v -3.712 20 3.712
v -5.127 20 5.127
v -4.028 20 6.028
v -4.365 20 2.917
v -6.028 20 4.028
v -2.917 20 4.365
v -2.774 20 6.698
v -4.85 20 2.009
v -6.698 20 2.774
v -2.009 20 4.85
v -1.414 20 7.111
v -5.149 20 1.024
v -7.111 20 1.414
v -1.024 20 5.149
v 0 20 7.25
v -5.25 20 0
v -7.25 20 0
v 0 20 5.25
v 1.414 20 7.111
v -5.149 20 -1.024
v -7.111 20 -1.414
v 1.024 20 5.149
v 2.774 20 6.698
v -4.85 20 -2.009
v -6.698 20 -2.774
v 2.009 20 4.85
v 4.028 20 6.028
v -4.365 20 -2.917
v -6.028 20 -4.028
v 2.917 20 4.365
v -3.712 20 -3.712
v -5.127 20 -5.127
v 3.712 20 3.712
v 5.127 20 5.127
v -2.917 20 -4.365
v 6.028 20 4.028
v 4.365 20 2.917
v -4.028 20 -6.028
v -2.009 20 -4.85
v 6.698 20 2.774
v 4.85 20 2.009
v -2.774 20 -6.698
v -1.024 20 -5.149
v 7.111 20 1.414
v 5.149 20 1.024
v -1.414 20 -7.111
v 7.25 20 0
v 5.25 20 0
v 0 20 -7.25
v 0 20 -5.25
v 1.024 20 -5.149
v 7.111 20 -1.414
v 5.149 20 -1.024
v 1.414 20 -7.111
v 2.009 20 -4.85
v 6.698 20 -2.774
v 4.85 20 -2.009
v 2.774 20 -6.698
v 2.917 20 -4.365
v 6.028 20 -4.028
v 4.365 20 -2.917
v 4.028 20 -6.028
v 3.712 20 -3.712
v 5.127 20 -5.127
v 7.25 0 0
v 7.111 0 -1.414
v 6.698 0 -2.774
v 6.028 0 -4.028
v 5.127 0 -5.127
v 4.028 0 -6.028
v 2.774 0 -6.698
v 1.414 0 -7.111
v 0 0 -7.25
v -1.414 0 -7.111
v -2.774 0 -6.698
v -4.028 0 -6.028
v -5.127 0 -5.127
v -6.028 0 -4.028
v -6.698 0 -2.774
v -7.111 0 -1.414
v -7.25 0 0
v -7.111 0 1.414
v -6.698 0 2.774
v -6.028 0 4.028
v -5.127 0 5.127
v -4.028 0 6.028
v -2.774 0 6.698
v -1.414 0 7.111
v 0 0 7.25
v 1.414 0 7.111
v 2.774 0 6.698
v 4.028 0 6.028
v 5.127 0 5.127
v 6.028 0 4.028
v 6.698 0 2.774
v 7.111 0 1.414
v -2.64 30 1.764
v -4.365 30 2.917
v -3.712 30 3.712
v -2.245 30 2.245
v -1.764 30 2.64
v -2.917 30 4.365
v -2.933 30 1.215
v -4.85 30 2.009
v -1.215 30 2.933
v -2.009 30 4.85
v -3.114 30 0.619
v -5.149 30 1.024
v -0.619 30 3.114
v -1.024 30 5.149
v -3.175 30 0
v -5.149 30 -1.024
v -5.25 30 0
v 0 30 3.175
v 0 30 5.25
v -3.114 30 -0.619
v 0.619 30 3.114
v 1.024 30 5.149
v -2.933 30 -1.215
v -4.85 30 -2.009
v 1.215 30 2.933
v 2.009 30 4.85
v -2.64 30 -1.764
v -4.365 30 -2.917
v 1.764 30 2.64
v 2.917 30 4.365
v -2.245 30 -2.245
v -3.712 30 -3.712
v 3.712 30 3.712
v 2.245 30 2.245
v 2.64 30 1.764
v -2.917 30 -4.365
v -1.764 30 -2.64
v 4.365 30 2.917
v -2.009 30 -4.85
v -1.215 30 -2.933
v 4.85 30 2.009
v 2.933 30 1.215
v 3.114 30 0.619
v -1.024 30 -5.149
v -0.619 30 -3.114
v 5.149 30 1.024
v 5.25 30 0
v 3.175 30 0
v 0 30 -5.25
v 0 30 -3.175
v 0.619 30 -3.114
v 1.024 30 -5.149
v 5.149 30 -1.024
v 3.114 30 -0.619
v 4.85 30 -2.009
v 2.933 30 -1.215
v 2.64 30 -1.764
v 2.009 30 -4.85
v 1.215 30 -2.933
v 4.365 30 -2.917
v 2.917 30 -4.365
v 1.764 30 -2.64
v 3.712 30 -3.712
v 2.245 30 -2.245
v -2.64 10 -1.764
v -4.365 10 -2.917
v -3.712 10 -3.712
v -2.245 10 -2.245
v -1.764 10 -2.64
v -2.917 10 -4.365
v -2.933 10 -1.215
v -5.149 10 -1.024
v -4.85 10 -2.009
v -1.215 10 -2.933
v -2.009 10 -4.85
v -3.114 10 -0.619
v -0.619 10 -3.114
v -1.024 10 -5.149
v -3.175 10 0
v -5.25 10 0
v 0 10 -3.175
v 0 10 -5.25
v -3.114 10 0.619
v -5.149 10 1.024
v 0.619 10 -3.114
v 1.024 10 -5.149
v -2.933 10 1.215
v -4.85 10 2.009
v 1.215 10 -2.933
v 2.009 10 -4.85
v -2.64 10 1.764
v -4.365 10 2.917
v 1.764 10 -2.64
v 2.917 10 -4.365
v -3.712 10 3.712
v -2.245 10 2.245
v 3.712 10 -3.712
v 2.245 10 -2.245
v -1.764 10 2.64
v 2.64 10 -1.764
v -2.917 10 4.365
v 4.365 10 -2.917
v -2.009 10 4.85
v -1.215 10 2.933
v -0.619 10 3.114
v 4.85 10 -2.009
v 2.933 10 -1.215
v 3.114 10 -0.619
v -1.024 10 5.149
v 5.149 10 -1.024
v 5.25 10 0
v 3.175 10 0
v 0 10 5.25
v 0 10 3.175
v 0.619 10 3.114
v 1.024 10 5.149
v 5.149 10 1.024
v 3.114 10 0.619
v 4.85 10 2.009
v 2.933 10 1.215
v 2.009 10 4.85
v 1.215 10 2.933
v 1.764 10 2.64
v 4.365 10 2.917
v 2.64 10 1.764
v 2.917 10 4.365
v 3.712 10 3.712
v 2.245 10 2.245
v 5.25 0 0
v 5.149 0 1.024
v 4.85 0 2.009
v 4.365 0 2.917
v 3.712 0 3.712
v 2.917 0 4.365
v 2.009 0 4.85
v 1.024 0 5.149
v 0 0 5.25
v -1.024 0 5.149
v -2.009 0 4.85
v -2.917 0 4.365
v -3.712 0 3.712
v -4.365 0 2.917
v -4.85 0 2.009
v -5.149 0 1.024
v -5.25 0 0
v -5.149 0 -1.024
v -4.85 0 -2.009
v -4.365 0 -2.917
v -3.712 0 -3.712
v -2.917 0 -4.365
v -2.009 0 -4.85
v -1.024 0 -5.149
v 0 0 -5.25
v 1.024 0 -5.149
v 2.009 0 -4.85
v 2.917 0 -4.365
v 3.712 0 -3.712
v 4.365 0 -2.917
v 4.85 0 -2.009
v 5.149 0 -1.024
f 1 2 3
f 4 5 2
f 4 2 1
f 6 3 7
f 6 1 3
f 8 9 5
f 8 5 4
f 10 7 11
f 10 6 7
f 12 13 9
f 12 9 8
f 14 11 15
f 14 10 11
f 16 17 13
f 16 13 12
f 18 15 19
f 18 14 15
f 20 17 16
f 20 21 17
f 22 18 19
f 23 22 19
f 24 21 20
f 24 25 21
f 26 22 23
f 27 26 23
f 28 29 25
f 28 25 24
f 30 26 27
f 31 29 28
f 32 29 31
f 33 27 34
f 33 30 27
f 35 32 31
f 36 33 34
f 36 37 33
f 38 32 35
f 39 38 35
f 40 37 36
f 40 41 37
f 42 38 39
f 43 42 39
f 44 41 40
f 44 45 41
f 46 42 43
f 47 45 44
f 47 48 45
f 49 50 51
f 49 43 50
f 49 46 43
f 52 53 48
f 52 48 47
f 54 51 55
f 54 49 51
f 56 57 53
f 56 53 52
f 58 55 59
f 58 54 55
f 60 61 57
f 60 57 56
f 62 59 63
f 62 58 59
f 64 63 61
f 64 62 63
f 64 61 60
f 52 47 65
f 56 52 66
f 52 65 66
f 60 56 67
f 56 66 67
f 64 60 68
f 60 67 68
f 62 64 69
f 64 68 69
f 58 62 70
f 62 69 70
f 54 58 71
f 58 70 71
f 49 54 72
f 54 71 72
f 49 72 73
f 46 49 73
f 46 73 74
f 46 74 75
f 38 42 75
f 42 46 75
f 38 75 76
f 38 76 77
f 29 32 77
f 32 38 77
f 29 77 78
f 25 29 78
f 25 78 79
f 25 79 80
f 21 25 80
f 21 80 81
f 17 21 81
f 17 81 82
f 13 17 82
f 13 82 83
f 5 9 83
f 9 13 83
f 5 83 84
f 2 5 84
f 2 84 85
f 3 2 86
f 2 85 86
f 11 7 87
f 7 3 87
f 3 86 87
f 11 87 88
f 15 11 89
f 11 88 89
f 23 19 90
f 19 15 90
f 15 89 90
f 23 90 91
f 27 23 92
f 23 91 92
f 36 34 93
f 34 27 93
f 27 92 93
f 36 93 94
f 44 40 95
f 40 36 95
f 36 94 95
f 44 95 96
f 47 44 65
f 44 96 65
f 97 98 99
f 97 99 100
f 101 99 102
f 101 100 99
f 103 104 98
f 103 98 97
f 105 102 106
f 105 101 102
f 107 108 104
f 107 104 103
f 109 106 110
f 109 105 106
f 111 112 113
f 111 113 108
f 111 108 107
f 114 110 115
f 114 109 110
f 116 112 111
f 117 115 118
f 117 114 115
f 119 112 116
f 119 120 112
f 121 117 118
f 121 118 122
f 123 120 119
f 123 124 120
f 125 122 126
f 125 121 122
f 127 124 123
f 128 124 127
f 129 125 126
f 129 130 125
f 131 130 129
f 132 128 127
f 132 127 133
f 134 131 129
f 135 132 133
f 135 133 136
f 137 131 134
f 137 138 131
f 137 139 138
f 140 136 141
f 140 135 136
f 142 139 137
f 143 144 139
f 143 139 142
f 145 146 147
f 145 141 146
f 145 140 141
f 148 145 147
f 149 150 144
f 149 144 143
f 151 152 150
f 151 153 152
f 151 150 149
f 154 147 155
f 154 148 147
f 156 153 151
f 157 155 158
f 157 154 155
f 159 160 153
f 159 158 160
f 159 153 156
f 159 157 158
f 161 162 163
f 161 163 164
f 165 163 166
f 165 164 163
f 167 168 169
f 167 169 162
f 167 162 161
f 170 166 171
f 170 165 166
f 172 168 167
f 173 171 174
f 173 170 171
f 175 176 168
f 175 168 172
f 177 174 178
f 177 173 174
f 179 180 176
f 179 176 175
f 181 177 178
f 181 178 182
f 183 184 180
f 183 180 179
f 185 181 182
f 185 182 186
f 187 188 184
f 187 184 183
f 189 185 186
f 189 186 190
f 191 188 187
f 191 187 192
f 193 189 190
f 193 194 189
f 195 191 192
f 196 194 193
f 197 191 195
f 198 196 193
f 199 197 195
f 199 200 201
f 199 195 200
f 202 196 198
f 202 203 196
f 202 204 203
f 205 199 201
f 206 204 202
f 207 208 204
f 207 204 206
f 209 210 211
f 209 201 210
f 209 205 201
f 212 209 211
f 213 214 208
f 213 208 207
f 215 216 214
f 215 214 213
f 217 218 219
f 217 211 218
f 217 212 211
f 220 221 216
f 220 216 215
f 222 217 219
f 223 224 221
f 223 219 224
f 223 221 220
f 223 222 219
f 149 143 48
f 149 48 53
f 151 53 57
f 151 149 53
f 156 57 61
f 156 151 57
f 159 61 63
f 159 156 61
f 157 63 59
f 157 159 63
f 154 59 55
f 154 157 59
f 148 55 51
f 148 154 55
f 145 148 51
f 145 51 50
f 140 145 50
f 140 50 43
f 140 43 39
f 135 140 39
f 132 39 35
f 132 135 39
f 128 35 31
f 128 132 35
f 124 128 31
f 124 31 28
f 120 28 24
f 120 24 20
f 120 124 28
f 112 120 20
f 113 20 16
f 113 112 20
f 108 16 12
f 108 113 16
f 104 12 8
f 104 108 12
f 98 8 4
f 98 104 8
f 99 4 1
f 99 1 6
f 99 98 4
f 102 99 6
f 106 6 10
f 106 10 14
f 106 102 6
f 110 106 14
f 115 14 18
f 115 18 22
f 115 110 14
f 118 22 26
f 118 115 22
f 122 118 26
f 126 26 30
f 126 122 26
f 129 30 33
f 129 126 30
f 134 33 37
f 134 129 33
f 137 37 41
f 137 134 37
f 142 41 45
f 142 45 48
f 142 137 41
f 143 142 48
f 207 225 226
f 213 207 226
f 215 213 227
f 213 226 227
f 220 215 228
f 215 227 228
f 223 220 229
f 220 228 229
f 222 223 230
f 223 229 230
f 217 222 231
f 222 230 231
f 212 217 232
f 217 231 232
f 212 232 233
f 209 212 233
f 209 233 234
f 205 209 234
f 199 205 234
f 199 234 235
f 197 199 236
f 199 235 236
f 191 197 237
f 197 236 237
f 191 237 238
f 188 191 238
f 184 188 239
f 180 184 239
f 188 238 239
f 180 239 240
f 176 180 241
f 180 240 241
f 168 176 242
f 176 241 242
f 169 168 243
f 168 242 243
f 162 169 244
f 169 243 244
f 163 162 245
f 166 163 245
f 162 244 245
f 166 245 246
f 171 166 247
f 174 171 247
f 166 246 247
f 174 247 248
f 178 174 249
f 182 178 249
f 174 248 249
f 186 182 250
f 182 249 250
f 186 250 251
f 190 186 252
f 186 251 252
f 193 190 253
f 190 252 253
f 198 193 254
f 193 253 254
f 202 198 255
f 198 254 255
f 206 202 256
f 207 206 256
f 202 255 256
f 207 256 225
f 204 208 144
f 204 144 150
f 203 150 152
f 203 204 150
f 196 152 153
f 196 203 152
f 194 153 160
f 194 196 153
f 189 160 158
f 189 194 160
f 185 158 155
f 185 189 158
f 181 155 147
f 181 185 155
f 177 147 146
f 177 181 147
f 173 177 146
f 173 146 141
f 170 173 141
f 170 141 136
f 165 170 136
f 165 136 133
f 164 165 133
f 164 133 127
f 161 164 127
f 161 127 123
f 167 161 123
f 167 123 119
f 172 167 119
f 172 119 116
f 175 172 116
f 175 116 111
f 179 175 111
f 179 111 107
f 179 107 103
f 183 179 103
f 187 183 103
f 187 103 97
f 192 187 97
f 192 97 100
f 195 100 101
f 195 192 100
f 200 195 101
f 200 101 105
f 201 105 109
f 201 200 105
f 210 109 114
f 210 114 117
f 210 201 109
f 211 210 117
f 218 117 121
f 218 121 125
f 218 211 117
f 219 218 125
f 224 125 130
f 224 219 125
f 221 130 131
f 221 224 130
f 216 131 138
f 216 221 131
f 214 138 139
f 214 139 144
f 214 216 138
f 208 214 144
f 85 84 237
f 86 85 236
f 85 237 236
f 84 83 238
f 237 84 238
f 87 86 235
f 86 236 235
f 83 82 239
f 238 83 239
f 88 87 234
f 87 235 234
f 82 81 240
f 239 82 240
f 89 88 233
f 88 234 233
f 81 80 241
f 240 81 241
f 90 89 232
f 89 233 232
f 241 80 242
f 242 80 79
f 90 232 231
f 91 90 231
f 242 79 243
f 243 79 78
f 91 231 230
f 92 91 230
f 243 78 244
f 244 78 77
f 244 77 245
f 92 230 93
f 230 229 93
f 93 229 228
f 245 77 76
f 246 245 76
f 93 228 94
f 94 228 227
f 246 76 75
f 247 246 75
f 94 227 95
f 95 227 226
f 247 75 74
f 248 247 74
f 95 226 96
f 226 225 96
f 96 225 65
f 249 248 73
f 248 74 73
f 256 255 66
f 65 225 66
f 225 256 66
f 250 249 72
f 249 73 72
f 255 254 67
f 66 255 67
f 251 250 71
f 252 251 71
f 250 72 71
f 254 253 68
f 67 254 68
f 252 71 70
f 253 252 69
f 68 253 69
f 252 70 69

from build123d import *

# Parameters (mm, degrees)
SKETCH1_R           = 7.25
SKETCH1_R_2         = 3.175
BOSS_EXTRUDE1_DEPTH = 30
SKETCH2_OUTSIDE_W   = 23.768
SKETCH2_OUTSIDE_H   = 23.768
SKETCH2_OUTSIDE_R   = 5.25
CUT_EXTRUDE1_DEPTH  = 10
SKETCH3_R           = 5.25
CUT_EXTRUDE2_DEPTH  = 10


with BuildPart() as part:
    # Sketch1 → Boss-Extrude1 (new body)
    with BuildSketch(Plane(origin=(0, 0, 0), x_dir=(1, 0, 0), z_dir=(0, 1, 0))):
        Circle(SKETCH1_R)
        Circle(SKETCH1_R_2, mode=Mode.SUBTRACT)
    extrude(amount=BOSS_EXTRUDE1_DEPTH)

    # Sketch2 outside → Cut-Extrude1 (cut)
    with BuildSketch(Plane(origin=(0, 30, 0), x_dir=(1, 0, 0), z_dir=(0, 1, 0))):
        Rectangle(SKETCH2_OUTSIDE_W, SKETCH2_OUTSIDE_H)
        Circle(SKETCH2_OUTSIDE_R, mode=Mode.SUBTRACT)
    extrude(amount=-CUT_EXTRUDE1_DEPTH, mode=Mode.SUBTRACT)

    # Sketch3 → Cut-Extrude2 (cut)
    with BuildSketch(Plane.XZ):
        Circle(SKETCH3_R)
    extrude(amount=-CUT_EXTRUDE2_DEPTH, mode=Mode.SUBTRACT)


solid = part.part
